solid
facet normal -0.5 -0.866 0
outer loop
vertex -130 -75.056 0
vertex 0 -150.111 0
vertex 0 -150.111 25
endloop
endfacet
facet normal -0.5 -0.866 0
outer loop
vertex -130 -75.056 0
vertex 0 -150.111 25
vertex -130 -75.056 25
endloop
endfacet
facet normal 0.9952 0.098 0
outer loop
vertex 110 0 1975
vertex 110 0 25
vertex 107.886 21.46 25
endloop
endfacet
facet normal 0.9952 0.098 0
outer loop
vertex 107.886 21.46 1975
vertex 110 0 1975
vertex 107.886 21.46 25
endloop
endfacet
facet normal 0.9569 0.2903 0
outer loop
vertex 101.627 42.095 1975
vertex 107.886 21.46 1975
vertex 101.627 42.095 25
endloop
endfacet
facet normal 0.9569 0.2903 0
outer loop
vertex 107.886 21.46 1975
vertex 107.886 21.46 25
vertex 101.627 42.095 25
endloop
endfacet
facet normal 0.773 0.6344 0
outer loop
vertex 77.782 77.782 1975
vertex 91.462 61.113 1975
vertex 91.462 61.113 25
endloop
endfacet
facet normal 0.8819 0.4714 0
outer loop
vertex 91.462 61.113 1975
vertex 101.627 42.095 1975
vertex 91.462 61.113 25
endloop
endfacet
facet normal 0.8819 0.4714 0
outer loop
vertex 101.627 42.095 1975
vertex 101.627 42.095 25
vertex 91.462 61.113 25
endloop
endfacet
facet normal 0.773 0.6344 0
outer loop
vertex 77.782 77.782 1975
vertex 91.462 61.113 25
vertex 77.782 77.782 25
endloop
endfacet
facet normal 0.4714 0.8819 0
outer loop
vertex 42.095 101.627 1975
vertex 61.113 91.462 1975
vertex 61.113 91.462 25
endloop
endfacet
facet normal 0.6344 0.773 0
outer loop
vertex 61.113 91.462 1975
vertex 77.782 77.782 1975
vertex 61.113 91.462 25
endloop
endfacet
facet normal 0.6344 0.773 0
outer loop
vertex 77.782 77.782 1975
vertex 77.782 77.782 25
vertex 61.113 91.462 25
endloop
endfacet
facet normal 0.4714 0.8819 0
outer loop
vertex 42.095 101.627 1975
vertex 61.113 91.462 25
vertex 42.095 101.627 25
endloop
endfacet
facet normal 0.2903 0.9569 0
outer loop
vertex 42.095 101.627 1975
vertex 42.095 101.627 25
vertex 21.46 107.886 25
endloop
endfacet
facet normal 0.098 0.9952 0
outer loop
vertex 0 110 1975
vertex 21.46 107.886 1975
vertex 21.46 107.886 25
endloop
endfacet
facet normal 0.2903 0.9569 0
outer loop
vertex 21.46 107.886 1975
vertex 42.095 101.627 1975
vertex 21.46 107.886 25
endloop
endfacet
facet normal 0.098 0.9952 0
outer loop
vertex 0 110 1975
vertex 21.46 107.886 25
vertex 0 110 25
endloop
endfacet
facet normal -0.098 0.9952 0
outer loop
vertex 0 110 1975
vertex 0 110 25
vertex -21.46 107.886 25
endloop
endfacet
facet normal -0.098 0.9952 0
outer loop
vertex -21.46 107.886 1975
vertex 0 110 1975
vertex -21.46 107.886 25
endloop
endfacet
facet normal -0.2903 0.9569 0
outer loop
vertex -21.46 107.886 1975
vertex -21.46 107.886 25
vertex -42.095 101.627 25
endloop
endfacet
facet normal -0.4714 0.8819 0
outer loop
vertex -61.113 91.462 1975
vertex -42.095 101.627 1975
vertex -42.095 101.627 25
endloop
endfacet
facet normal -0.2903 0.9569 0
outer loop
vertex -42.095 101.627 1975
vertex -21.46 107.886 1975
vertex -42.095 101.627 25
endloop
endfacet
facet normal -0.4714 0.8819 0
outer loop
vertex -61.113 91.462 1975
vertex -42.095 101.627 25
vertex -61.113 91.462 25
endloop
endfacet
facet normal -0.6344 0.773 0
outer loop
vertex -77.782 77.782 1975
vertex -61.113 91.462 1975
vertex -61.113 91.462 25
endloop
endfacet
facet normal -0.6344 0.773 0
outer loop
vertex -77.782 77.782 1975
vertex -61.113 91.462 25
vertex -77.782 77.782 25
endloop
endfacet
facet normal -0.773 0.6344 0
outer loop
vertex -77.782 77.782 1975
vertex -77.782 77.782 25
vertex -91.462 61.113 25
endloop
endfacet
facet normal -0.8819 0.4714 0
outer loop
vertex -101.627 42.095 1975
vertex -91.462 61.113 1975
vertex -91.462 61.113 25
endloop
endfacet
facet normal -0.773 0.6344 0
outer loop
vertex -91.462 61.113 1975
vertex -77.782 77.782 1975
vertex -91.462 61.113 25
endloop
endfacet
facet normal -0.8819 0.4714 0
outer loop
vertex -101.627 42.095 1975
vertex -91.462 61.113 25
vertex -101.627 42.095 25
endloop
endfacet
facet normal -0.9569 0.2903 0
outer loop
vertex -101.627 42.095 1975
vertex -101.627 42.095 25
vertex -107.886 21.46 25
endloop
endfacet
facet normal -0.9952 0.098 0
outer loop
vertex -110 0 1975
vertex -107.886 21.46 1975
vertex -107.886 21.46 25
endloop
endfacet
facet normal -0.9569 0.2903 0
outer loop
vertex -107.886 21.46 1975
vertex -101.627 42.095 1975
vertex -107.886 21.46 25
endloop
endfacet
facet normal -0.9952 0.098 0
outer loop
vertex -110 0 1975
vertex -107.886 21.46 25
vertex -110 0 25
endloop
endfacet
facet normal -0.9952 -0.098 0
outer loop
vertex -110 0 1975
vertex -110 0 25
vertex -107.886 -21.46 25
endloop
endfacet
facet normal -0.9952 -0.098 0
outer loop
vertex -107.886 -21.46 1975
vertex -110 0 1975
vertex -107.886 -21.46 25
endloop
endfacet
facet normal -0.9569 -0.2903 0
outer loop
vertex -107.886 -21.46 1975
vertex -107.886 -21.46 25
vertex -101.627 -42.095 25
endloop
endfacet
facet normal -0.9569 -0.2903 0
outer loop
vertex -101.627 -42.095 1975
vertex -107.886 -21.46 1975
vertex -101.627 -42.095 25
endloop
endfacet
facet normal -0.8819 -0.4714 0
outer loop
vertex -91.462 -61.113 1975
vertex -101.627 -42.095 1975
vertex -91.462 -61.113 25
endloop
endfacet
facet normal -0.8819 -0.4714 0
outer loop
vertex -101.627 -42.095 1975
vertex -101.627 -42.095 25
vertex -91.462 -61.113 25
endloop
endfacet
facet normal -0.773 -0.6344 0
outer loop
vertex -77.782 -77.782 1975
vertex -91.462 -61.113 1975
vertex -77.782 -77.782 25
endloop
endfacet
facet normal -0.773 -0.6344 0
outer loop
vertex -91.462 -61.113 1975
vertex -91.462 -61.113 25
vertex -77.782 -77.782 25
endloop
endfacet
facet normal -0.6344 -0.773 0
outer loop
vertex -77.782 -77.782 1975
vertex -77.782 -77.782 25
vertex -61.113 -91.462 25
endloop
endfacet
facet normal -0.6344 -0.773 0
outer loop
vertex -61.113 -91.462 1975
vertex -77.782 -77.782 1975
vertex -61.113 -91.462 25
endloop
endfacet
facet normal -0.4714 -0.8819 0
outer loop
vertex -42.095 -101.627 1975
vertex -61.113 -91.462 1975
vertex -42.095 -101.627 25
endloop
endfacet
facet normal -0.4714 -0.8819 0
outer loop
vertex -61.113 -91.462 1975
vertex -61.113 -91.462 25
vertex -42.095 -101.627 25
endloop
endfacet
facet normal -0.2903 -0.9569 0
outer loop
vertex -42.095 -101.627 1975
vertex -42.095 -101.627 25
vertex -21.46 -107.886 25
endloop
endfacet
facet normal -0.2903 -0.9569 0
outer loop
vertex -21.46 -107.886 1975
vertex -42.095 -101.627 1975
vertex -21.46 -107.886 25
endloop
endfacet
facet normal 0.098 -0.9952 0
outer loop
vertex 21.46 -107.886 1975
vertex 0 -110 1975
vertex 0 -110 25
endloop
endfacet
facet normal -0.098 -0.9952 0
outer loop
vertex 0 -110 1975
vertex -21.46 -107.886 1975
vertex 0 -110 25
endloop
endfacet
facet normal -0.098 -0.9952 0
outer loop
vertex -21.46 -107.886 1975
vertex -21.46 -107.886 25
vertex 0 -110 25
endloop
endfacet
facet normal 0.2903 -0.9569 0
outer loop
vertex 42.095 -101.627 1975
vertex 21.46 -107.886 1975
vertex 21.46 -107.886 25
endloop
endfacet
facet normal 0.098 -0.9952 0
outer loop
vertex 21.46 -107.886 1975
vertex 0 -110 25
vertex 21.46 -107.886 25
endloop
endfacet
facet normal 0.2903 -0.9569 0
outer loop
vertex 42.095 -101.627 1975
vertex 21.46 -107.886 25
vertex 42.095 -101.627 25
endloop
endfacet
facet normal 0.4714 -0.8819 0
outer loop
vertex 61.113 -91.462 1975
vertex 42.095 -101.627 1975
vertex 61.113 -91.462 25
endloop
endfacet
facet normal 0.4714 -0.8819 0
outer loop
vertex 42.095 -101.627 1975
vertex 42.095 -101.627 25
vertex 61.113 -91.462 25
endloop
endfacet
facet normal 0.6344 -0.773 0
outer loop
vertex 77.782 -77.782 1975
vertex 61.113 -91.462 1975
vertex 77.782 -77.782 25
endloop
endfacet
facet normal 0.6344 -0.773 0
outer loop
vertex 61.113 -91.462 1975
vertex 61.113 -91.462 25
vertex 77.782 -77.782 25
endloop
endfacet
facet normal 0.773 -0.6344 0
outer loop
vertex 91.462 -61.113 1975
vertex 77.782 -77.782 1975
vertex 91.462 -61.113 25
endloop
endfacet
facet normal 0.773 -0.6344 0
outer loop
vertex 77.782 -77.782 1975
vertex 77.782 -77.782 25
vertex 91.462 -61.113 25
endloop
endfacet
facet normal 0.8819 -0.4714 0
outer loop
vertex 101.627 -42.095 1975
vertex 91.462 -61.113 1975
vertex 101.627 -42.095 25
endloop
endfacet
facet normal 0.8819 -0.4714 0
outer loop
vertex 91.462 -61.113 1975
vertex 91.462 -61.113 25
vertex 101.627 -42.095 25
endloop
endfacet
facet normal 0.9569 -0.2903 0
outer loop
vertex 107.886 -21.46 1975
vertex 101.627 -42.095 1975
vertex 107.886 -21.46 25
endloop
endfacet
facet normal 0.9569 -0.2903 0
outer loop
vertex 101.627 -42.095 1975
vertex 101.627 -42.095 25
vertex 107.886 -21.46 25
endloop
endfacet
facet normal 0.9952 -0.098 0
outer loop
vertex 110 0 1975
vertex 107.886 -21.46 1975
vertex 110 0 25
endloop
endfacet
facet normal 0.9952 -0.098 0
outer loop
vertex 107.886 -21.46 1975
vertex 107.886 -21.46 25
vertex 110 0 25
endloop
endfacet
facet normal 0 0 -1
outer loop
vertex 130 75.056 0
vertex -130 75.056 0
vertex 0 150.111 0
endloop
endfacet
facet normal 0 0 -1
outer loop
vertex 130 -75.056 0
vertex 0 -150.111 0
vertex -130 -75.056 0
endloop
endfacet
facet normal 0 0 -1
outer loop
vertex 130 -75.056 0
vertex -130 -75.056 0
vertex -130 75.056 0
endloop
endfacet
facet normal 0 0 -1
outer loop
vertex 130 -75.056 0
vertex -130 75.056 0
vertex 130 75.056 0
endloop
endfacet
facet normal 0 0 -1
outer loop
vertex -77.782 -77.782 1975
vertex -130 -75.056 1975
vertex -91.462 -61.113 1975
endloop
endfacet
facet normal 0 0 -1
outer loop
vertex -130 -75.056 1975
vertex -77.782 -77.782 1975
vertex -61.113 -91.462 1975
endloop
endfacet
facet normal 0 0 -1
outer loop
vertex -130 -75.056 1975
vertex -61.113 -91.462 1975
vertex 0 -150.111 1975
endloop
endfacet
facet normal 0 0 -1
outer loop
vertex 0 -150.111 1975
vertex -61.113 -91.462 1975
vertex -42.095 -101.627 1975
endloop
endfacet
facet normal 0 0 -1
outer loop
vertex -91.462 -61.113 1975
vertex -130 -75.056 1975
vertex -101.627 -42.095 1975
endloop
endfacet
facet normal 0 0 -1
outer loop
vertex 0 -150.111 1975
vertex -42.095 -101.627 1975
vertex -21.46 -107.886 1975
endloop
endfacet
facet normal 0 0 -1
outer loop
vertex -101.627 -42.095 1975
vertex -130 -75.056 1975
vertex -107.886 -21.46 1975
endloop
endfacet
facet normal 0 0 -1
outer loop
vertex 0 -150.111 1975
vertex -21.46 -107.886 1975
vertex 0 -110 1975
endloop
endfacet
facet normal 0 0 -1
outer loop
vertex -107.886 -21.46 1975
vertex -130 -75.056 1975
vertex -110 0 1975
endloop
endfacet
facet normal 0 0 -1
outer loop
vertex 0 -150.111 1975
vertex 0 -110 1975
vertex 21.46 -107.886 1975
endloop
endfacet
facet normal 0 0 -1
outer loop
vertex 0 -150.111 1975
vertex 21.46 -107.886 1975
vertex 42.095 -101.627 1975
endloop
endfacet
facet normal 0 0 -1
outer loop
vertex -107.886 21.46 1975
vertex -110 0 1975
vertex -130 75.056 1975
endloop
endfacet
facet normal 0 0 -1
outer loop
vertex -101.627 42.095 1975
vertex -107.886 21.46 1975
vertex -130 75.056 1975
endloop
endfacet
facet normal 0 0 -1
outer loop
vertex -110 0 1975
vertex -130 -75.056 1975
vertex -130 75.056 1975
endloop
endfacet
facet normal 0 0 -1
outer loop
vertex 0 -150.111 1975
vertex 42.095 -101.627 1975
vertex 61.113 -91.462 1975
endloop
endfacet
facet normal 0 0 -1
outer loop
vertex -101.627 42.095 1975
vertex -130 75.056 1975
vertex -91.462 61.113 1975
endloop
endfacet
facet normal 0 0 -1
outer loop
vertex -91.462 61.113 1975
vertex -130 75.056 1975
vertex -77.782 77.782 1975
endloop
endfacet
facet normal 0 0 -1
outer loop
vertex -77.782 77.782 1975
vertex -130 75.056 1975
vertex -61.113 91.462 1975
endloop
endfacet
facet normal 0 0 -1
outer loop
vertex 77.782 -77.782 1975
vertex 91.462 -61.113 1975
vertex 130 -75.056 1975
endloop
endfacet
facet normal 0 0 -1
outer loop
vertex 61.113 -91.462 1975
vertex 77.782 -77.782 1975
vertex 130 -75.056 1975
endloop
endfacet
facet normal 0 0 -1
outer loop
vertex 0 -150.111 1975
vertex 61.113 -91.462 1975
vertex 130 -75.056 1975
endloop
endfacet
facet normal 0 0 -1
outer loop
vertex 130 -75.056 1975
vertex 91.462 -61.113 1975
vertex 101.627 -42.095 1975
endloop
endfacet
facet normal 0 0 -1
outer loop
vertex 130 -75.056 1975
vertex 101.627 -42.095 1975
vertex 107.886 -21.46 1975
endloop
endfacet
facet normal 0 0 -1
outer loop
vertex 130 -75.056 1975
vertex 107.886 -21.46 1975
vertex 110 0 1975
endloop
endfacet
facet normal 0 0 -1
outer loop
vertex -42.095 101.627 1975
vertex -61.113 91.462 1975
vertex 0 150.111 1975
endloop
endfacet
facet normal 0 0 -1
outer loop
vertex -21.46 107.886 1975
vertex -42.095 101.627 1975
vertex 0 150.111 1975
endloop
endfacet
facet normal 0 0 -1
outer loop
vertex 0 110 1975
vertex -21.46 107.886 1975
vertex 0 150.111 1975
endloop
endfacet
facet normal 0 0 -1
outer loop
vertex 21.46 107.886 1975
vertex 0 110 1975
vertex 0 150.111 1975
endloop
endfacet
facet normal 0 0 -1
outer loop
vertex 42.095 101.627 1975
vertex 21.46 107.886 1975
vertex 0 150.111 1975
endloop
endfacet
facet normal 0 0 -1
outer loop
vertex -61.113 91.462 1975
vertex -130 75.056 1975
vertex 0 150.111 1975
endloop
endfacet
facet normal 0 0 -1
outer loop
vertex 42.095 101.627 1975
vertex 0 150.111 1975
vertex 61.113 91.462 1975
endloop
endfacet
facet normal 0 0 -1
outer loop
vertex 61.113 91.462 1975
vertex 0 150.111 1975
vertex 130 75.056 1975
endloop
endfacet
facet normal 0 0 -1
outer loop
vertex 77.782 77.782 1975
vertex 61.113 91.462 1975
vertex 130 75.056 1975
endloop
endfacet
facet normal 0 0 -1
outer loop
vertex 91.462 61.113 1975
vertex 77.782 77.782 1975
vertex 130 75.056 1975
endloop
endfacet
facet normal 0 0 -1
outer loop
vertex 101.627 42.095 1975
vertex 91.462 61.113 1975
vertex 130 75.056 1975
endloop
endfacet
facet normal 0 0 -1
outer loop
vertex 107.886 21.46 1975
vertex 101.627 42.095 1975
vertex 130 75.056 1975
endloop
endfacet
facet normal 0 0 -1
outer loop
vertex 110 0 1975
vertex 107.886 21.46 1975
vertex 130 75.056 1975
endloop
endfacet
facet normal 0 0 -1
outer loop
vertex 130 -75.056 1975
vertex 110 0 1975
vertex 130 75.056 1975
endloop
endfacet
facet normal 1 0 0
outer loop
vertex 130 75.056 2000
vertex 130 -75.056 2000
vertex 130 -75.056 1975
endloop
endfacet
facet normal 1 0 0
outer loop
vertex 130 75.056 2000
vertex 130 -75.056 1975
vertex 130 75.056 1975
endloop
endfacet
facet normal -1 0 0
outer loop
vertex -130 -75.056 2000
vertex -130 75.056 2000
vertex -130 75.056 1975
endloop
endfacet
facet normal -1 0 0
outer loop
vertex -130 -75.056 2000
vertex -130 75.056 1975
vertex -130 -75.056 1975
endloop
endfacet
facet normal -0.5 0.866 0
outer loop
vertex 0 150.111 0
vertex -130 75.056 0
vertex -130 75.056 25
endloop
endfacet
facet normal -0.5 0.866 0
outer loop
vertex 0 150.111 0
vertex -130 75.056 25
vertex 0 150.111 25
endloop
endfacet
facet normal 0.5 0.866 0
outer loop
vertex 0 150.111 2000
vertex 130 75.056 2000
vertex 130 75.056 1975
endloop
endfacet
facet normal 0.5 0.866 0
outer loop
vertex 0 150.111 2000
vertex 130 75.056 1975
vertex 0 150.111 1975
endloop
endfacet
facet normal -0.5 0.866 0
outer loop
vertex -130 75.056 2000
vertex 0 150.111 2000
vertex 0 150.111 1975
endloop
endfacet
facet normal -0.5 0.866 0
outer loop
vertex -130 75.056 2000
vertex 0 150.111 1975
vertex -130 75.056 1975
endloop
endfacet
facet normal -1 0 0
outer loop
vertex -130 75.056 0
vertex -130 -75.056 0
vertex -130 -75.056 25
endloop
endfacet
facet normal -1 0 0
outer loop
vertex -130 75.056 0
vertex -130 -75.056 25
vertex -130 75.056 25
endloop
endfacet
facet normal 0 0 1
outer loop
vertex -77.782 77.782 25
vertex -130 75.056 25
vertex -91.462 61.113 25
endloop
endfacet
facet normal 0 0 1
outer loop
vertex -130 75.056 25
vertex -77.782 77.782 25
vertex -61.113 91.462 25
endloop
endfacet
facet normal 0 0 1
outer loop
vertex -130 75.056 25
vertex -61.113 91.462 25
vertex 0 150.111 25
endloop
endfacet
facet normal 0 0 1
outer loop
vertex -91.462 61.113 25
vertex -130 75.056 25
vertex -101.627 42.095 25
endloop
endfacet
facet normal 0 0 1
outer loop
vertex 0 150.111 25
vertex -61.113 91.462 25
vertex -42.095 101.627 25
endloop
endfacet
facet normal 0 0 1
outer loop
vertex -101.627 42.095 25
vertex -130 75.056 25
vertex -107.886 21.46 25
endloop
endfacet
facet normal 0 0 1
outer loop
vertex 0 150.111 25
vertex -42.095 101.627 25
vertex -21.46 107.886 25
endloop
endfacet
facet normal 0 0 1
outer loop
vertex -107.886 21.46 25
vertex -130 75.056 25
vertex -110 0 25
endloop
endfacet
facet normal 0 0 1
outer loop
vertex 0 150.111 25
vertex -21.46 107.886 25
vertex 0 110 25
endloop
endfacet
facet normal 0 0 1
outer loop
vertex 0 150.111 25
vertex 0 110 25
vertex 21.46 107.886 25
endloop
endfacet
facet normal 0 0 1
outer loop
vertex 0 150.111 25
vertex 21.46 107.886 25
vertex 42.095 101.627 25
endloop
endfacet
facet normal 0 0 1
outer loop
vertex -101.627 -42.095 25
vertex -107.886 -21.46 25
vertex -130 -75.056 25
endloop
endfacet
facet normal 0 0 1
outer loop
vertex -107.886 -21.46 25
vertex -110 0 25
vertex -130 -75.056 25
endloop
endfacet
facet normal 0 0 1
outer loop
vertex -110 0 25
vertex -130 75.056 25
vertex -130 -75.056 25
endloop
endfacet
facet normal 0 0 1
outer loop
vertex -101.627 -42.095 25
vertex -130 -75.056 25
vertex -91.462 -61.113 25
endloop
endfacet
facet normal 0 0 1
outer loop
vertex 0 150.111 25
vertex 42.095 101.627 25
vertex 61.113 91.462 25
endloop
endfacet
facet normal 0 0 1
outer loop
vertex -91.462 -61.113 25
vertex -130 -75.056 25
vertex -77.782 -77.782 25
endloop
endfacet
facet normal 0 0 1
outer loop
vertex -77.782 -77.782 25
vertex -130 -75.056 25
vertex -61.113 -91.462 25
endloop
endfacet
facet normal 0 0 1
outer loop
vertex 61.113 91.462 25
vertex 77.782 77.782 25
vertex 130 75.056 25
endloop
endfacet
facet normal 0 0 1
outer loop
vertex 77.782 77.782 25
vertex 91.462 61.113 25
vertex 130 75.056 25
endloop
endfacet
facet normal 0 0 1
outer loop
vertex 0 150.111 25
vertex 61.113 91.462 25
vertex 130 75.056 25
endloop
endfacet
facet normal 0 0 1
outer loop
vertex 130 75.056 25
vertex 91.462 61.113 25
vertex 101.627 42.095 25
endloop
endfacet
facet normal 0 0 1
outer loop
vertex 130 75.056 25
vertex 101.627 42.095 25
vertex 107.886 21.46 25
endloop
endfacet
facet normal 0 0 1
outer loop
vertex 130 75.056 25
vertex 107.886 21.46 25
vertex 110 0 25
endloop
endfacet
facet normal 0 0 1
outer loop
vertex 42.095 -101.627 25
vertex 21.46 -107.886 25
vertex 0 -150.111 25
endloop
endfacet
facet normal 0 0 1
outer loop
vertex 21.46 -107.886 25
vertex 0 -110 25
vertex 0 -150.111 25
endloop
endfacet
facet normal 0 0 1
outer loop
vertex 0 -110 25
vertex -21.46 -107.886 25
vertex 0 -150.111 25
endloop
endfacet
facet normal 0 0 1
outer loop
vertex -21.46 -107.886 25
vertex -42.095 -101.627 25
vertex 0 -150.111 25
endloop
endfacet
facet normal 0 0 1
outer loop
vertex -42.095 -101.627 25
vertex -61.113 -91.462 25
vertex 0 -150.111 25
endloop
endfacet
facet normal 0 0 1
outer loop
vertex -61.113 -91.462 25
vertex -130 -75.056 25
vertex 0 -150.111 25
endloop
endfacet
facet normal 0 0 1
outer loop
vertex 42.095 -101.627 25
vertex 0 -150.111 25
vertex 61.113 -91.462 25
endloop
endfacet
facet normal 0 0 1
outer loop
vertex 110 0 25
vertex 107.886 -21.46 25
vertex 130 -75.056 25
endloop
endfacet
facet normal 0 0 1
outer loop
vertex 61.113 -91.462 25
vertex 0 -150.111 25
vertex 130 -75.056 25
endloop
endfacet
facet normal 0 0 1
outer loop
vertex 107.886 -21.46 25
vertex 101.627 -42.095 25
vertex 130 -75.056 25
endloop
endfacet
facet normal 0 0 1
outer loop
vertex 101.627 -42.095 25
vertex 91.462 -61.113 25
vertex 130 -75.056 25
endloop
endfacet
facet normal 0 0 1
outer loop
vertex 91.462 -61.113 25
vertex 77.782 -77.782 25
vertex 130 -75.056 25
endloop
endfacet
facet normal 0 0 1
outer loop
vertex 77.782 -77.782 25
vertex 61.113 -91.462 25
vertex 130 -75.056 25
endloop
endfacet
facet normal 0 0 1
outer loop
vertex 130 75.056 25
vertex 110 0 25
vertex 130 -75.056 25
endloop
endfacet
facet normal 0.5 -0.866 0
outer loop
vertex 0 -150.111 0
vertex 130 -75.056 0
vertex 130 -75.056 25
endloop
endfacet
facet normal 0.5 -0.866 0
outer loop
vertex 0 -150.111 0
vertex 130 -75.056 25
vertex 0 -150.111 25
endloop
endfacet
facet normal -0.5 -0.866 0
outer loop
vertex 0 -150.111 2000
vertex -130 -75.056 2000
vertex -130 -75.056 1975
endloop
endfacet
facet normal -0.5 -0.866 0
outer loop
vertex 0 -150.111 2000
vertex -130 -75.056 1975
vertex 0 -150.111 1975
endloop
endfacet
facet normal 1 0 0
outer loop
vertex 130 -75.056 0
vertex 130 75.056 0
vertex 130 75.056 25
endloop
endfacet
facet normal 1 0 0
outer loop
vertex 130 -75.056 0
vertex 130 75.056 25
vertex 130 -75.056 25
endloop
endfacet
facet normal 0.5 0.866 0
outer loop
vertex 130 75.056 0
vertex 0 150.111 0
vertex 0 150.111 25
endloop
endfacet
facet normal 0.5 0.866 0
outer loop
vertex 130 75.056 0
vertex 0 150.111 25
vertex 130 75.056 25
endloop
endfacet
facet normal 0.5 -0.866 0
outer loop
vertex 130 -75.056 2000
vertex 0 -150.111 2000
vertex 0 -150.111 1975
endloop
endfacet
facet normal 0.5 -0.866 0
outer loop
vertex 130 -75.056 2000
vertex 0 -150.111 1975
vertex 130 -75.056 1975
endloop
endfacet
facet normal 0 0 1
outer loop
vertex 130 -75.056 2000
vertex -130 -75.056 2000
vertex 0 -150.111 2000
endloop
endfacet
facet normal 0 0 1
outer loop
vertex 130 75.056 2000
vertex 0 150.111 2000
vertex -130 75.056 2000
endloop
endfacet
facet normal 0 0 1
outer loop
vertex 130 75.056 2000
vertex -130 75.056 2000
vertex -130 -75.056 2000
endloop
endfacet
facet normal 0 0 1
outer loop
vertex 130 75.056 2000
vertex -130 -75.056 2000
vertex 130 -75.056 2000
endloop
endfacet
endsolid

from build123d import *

# Parameters (mm, degrees)
F0_R     = 110
F1_DEPTH = 2000
F3_DEPTH = 25
F5_DEPTH = 25


with BuildPart() as f1:
    # F0 (on Top) → F1 (new body)
    with BuildSketch(Plane.XY):
        Circle(F0_R)
    extrude(amount=F1_DEPTH)

    # F2 (on face) → F3 (join)
    with BuildSketch(Plane(origin=(0, 0, 0), x_dir=(1, 0, 0), z_dir=(0, 0, -1))):
        Polygon((130, -75.055535), (130, 75.055535), (0, 150.11107), (-130, 75.055535), (-130, -75.055535), (0, -150.11107), align=None)
    extrude(amount=-F3_DEPTH)

    # F4 (on face) → F5 (join)
    with BuildSketch(Plane.XY.offset(2000)):
        Polygon((130, -75.055535), (130, 75.055535), (0, 150.11107), (-130, 75.055535), (-130, -75.055535), (0, -150.11107), align=None)
    extrude(amount=-F5_DEPTH)


solid = f1.part
